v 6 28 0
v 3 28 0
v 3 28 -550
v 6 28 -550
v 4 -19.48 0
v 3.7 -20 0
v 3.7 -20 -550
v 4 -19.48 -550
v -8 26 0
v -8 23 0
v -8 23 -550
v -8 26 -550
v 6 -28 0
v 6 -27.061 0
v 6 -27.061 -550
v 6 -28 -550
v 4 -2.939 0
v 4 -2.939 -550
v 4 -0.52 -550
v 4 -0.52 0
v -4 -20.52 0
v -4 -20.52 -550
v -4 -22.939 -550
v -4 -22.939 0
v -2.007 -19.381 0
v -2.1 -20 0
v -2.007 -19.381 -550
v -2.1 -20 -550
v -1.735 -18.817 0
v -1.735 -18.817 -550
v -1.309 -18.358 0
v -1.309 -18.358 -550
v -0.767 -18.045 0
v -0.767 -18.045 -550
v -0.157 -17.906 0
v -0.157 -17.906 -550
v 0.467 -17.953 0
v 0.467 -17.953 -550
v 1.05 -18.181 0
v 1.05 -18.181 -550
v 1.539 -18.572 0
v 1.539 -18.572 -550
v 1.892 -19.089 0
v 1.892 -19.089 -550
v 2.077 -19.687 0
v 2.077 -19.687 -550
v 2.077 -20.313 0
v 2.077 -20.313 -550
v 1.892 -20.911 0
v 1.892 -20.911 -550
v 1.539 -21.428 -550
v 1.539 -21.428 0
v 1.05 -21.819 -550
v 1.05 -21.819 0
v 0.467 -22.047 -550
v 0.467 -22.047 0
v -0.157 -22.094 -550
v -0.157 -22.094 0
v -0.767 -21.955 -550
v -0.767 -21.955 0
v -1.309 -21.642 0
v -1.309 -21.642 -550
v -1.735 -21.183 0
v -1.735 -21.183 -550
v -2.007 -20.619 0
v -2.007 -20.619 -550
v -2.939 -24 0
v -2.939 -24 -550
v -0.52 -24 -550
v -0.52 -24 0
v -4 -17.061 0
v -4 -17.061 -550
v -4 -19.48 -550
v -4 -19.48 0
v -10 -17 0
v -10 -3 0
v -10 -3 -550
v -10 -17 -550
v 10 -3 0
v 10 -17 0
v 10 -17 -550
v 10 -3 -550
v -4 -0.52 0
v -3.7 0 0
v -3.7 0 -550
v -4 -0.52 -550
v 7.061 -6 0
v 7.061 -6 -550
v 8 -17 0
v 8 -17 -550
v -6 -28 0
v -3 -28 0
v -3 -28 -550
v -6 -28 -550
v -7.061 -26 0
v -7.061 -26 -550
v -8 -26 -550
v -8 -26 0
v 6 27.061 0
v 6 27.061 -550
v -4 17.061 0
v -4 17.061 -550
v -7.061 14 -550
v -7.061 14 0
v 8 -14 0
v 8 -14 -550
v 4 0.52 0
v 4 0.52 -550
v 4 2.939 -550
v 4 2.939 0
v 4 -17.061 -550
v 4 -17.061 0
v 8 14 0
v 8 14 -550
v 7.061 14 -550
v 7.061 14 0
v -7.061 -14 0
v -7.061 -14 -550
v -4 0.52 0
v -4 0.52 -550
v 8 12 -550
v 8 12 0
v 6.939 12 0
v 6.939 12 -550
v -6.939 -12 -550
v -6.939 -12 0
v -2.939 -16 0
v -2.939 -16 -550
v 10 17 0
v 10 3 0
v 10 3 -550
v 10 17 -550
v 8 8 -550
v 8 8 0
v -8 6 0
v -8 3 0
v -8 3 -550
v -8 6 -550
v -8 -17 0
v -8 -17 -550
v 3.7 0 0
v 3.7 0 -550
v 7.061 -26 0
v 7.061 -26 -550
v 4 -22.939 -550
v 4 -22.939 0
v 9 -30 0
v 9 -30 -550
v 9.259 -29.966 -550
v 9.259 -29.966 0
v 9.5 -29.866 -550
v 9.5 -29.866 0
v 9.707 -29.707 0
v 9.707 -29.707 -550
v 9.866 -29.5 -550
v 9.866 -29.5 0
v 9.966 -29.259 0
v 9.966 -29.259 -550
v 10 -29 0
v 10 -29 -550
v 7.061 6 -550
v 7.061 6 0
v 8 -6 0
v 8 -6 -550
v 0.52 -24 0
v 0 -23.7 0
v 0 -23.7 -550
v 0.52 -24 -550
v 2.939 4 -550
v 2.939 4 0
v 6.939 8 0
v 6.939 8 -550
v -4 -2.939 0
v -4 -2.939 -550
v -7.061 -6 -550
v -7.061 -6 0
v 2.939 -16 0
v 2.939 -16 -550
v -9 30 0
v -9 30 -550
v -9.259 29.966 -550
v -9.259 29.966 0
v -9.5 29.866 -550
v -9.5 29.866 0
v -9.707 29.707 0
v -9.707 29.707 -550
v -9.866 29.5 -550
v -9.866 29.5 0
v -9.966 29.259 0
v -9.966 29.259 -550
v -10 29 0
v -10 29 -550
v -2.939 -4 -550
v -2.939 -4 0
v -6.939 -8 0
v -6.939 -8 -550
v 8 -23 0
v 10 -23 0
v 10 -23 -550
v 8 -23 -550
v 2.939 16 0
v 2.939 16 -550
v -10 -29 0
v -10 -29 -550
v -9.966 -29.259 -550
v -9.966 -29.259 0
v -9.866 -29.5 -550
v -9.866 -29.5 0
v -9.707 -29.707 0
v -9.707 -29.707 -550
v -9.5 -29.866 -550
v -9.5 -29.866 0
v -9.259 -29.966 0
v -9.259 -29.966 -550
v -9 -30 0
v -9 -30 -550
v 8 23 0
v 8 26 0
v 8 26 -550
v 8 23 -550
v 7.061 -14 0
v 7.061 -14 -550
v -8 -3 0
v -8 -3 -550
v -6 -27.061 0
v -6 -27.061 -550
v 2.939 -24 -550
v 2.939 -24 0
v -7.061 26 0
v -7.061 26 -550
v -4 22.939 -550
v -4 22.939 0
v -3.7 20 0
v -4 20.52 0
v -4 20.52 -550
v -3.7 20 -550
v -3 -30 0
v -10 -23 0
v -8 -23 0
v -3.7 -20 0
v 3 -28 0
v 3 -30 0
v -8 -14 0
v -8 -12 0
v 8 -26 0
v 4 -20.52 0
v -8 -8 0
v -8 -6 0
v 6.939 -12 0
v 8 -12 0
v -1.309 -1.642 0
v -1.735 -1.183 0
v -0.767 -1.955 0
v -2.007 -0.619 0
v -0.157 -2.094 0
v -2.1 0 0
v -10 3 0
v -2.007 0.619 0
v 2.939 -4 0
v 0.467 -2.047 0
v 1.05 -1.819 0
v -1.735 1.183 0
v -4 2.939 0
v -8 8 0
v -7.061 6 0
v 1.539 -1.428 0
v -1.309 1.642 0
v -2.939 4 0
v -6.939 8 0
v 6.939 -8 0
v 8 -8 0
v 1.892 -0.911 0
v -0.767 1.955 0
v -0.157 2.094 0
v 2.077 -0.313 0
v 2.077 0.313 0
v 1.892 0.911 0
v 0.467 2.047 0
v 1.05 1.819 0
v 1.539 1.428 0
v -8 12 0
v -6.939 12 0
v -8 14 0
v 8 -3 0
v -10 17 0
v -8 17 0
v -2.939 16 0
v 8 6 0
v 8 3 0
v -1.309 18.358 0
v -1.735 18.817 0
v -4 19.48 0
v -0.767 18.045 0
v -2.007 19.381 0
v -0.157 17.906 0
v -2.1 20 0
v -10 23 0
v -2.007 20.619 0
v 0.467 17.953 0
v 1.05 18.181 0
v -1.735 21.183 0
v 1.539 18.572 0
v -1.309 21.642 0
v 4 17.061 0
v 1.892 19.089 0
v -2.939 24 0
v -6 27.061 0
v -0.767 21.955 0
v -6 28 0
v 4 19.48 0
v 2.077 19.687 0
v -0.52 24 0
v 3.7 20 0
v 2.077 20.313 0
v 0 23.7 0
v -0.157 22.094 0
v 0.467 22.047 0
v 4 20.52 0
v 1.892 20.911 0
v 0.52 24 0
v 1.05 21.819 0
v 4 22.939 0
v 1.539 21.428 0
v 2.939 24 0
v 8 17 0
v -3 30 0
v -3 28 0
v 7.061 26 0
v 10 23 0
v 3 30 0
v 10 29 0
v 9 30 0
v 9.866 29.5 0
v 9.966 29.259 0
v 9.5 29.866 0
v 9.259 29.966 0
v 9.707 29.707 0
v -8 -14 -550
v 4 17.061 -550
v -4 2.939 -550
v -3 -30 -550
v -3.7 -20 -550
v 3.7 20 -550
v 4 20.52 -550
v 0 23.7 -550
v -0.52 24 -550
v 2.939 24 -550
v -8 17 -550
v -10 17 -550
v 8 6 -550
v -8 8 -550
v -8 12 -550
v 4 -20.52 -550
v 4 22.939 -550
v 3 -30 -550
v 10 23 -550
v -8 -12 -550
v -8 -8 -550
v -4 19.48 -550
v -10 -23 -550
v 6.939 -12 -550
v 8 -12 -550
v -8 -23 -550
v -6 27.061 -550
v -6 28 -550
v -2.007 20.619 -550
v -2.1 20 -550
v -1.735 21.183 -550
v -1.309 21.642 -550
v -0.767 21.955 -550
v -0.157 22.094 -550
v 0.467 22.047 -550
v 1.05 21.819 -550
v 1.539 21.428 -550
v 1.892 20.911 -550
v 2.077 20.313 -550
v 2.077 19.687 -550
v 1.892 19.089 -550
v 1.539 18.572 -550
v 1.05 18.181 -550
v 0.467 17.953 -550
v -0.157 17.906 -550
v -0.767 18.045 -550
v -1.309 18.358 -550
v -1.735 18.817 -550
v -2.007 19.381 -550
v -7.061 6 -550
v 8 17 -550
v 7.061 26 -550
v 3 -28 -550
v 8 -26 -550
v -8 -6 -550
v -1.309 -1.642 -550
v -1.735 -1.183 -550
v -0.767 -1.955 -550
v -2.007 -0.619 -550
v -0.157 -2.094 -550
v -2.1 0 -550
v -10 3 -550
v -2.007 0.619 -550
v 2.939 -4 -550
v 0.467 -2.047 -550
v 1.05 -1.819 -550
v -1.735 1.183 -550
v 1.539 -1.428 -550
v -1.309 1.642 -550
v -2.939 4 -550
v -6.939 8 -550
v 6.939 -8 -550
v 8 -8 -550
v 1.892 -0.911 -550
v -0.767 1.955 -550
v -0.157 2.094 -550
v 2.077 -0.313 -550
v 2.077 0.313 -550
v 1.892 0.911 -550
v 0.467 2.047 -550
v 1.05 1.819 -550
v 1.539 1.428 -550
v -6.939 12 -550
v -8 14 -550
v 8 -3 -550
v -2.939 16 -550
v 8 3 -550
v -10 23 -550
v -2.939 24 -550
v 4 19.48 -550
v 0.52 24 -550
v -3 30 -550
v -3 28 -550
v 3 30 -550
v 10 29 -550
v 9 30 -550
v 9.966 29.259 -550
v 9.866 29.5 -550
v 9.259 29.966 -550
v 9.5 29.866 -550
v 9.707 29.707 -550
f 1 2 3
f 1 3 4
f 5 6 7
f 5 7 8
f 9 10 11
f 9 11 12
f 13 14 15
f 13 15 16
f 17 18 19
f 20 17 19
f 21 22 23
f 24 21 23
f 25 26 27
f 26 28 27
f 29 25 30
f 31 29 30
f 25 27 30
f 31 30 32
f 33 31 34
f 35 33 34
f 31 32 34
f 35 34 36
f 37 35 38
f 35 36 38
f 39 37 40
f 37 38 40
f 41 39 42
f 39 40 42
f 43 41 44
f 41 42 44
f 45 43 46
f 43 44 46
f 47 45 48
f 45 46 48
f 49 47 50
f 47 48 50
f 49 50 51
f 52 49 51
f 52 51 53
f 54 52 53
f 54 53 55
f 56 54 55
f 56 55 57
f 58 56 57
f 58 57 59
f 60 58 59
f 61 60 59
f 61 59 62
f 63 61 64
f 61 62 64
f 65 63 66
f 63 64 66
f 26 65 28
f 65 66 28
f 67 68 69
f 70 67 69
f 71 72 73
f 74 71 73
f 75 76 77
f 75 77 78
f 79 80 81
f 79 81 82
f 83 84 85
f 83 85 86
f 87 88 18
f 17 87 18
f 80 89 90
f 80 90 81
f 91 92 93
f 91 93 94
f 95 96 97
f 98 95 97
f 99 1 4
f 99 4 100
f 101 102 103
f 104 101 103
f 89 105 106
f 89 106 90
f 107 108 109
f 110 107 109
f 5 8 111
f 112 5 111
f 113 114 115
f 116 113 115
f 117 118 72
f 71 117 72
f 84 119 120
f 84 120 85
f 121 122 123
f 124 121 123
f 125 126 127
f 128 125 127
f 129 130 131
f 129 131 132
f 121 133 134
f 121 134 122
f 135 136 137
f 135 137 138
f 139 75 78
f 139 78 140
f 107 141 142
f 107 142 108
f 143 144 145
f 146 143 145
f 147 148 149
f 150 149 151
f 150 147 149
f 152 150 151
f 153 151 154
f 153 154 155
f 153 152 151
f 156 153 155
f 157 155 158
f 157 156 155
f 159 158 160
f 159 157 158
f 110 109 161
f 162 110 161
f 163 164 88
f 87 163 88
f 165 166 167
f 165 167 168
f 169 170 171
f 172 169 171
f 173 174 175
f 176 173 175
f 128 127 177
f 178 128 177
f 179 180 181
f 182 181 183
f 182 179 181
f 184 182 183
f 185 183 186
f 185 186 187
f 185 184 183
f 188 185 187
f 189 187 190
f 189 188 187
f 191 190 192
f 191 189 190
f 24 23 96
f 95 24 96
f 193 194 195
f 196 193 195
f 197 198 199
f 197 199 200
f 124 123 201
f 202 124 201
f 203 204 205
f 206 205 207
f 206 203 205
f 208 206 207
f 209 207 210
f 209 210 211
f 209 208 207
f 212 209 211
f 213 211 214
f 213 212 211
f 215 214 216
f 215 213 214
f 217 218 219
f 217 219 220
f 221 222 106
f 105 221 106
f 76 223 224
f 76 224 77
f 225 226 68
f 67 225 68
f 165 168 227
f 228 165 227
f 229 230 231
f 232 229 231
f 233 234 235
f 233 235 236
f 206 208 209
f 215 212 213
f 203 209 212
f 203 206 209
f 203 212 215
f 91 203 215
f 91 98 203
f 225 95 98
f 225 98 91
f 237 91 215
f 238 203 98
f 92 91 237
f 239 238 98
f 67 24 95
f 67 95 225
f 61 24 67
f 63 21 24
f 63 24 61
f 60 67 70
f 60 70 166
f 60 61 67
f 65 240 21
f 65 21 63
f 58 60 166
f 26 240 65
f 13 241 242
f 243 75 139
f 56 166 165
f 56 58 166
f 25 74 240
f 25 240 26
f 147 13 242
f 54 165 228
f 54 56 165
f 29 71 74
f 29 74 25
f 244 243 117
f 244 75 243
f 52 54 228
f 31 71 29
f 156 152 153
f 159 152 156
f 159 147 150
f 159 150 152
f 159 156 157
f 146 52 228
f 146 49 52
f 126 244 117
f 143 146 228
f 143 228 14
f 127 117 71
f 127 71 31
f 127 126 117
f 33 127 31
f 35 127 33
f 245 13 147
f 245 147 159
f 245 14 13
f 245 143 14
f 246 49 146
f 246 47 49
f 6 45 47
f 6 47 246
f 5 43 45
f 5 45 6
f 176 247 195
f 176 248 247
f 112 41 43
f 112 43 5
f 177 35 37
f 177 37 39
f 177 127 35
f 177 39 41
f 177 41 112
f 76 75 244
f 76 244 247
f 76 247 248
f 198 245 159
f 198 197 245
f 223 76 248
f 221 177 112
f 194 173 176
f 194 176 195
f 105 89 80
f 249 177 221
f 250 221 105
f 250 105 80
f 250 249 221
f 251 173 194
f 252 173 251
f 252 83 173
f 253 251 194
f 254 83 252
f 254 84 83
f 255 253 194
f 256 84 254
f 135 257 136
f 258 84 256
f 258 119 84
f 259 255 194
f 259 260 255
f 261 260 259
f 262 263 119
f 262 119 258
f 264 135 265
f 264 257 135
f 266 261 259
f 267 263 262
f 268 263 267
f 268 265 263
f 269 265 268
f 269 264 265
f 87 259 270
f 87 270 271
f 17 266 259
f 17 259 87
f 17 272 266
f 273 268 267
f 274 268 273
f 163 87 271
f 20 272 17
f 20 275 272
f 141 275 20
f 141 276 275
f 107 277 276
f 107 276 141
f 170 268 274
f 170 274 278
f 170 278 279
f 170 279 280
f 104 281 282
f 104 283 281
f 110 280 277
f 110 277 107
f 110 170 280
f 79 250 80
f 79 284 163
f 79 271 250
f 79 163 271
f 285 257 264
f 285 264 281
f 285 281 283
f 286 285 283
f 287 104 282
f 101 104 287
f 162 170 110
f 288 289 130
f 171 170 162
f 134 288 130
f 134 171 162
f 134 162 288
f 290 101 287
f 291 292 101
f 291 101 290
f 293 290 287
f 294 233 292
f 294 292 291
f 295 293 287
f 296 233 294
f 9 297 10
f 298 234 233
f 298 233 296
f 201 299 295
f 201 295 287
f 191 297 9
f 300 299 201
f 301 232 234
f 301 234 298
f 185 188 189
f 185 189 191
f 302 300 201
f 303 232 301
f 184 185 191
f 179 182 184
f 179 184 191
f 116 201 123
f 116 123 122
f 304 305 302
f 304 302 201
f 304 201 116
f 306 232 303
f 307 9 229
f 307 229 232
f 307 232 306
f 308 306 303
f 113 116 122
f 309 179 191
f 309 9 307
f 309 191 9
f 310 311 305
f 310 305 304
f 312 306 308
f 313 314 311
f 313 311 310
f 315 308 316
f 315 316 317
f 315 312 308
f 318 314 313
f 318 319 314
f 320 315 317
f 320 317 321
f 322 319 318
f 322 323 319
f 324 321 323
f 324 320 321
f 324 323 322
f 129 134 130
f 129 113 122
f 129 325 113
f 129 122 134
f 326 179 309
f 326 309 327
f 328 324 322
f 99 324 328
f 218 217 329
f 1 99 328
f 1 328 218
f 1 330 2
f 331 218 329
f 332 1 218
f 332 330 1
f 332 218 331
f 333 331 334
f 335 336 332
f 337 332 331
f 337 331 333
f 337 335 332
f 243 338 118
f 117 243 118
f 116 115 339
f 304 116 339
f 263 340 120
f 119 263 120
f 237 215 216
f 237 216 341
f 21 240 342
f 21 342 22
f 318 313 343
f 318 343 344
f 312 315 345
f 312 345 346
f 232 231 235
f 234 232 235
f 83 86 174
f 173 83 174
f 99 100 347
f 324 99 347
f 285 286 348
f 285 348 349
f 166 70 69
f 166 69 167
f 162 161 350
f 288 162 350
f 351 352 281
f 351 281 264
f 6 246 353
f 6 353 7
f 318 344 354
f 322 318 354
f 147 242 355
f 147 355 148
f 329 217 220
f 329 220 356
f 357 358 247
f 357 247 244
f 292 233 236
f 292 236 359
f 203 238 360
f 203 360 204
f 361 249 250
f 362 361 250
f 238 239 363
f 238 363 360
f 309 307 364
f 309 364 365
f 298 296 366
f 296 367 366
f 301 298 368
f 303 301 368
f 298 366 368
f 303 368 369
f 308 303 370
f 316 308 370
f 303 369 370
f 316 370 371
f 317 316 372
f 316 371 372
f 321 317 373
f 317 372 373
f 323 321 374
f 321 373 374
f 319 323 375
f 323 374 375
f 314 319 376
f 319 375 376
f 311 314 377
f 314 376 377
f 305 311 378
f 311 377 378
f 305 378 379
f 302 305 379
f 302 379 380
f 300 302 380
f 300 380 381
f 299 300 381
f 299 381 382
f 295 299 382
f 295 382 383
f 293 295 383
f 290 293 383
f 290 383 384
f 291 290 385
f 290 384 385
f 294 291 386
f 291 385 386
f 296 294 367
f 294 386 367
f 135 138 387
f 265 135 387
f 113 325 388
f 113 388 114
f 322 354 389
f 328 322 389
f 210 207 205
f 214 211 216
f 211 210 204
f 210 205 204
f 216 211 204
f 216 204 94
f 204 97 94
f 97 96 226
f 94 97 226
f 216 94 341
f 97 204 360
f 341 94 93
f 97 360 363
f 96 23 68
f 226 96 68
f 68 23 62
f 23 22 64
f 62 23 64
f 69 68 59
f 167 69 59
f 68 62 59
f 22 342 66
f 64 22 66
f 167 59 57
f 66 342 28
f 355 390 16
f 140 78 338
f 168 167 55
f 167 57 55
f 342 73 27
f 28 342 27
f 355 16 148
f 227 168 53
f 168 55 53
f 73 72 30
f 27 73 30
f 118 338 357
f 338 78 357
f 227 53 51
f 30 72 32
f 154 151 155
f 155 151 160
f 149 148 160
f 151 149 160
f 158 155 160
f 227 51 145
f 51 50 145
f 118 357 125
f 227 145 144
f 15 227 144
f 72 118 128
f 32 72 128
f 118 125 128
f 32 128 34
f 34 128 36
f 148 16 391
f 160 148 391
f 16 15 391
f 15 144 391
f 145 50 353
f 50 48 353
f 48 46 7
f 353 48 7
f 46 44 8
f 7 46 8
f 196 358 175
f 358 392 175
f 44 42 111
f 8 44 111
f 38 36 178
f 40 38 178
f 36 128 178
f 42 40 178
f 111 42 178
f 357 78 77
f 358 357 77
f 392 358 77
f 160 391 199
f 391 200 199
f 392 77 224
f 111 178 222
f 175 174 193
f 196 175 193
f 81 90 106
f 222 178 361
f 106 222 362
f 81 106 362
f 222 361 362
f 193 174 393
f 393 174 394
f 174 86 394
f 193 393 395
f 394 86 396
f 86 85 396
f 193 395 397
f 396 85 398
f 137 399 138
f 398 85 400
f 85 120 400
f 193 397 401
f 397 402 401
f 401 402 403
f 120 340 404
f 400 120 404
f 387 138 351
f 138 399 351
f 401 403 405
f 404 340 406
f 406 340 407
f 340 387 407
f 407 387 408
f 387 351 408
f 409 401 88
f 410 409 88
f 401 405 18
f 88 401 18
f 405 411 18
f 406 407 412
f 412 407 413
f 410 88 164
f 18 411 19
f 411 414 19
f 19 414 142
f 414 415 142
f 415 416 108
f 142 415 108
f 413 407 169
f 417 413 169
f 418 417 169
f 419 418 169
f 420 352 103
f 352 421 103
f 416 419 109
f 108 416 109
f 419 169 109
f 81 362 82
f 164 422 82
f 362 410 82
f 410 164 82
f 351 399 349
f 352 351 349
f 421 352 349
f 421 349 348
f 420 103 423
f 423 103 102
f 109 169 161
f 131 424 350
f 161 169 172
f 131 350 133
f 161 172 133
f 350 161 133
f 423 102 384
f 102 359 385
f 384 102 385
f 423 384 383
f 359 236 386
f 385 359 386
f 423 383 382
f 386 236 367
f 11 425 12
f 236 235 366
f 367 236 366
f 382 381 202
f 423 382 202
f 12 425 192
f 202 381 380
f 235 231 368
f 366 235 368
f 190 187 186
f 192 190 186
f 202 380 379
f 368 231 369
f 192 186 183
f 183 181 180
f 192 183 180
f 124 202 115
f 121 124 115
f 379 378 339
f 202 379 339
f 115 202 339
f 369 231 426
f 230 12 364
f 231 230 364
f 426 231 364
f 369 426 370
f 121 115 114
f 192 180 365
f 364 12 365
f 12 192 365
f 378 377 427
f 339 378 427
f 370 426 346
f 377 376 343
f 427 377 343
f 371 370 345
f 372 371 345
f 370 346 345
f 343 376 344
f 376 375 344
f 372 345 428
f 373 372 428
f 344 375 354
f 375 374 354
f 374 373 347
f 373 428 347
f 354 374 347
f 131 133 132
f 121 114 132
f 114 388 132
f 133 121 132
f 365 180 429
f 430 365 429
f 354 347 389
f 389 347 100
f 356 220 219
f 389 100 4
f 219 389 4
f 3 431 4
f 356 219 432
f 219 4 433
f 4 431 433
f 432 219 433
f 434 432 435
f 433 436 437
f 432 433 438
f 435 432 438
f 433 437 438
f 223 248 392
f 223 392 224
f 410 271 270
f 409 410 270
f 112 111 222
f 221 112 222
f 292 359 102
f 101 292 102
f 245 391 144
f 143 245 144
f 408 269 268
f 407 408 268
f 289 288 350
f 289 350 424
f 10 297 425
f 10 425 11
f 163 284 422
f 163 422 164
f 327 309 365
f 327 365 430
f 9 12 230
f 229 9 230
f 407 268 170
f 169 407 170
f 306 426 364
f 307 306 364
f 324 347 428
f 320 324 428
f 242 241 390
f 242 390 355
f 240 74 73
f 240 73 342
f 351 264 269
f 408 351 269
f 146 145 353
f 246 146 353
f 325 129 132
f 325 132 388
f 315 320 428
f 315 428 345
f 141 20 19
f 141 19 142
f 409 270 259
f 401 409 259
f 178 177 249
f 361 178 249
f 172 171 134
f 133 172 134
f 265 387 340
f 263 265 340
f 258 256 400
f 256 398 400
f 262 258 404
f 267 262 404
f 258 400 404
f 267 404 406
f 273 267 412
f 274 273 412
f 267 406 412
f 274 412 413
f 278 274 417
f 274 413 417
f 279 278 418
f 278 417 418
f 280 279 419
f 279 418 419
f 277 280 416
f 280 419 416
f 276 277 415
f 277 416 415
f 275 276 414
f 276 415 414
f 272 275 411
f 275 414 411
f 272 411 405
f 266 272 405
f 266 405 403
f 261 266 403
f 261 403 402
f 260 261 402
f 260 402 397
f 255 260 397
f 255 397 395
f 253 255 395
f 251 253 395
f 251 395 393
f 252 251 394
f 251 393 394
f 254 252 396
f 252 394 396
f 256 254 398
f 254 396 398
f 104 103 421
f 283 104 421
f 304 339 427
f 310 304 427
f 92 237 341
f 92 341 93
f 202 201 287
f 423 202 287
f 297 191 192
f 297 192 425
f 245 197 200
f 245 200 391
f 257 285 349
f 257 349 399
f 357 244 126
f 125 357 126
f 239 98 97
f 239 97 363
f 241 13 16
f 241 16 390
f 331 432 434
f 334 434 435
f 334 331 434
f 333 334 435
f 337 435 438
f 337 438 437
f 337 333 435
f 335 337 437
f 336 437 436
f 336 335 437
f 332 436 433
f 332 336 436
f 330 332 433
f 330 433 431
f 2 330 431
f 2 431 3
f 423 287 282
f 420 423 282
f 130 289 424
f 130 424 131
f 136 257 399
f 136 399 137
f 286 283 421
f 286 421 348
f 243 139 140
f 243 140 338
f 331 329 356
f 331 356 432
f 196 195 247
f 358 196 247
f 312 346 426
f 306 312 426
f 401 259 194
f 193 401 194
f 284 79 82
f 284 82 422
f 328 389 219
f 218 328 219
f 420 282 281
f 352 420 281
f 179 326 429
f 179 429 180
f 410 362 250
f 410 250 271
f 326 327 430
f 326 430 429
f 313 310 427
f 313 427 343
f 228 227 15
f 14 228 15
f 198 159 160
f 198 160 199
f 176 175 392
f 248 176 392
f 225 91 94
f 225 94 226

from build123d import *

# Parameters (mm, degrees)
BOSS_EXTRUDE1_DEPTH = 550
SKETCH2_W           = 550
SKETCH2_H           = 2.1
SKETCH3_W           = 550
SKETCH3_H           = 2.1
SKETCH4_W           = 550
SKETCH4_H           = 2.1


with BuildPart() as part:
    # Sketch1 → Boss-Extrude1 (new body)
    with BuildSketch(Plane.XY):
        with BuildLine():
            Line((-10, -17), (-8, -17))
            Line((-8, -17), (-8, -14))
            Line((-8, -14), (-7.060660172, -14))
            Line((-7.060660172, -14), (-4, -17.060660172))
            Line((-4, -17.060660172), (-4, -19.480384758))
            Line((-4, -19.480384758), (-3.7, -20))
            Line((-3.7, -20), (-4, -20.519615242))
            Line((-4, -20.519615242), (-4, -22.939339828))
            Line((-4, -22.939339828), (-7.060660172, -26))
            Line((-7.060660172, -26), (-8, -26))
            Line((-8, -26), (-8, -23))
            Line((-8, -23), (-10, -23))
            Line((-10, -23), (-10, -29))
            ThreePointArc((-10, -29), (-9.707106781, -29.707106781), (-9, -30))
            Line((-9, -30), (-3, -30))
            Line((-3, -30), (-3, -28))
            Line((-3, -28), (-6, -28))
            Line((-6, -28), (-6, -27.060660172))
            Line((-6, -27.060660172), (-2.939339828, -24))
            Line((-2.939339828, -24), (-0.519615242, -24))
            Line((-0.519615242, -24), (0, -23.7))
            Line((0, -23.7), (0.519615242, -24))
            Line((0.519615242, -24), (2.939339828, -24))
            Line((2.939339828, -24), (6, -27.060660172))
            Line((6, -27.060660172), (6, -28))
            Line((6, -28), (3, -28))
            Line((3, -28), (3, -30))
            Line((3, -30), (9, -30))
            ThreePointArc((9, -30), (9.707106781, -29.707106781), (10, -29))
            Line((10, -29), (10, -23))
            Line((10, -23), (8, -23))
            Line((8, -23), (8, -26))
            Line((8, -26), (7.060660172, -26))
            Line((7.060660172, -26), (4, -22.939339828))
            Line((4, -22.939339828), (4, -20.519615242))
            Line((4, -20.519615242), (3.7, -20))
            Line((3.7, -20), (4, -19.480384758))
            Line((4, -19.480384758), (4, -17.060660172))
            Line((4, -17.060660172), (7.060660172, -14))
            Line((7.060660172, -14), (8, -14))
            Line((8, -14), (8, -17))
            Line((8, -17), (10, -17))
            Line((10, -17), (10, -3))
            Line((10, -3), (8, -3))
            Line((8, -3), (8, -6))
            Line((8, -6), (7.060660172, -6))
            Line((7.060660172, -6), (4, -2.939339828))
            Line((4, -2.939339828), (4, -0.519615242))
            Line((4, -0.519615242), (3.7, 0))
            Line((3.7, 0), (4, 0.519615242))
            Line((4, 0.519615242), (4, 2.939339828))
            Line((4, 2.939339828), (7.060660172, 6))
            Line((7.060660172, 6), (8, 6))
            Line((8, 6), (8, 3))
            Line((8, 3), (10, 3))
            Line((10, 3), (10, 17))
            Line((10, 17), (8, 17))
            Line((8, 17), (8, 14))
            Line((8, 14), (7.060660172, 14))
            Line((7.060660172, 14), (4, 17.060660172))
            Line((4, 17.060660172), (4, 19.480384758))
            Line((4, 19.480384758), (3.7, 20))
            Line((3.7, 20), (4, 20.519615242))
            Line((4, 20.519615242), (4, 22.939339828))
            Line((4, 22.939339828), (7.060660172, 26))
            Line((7.060660172, 26), (8, 26))
            Line((8, 26), (8, 23))
            Line((8, 23), (10, 23))
            Line((10, 23), (10, 29))
            ThreePointArc((10, 29), (9.707106781, 29.707106781), (9, 30))
            Line((9, 30), (3, 30))
            Line((3, 30), (3, 28))
            Line((3, 28), (6, 28))
            Line((6, 28), (6, 27.060660172))
            Line((6, 27.060660172), (2.939339828, 24))
            Line((2.939339828, 24), (0.519615242, 24))
            Line((0.519615242, 24), (0, 23.7))
            Line((0, 23.7), (-0.519615242, 24))
            Line((-0.519615242, 24), (-2.939339828, 24))
            Line((-2.939339828, 24), (-6, 27.060660172))
            Line((-6, 27.060660172), (-6, 28))
            Line((-6, 28), (-3, 28))
            Line((-3, 28), (-3, 30))
            Line((-3, 30), (-9, 30))
            ThreePointArc((-9, 30), (-9.707106781, 29.707106781), (-10, 29))
            Line((-10, 29), (-10, 23))
            Line((-10, 23), (-8, 23))
            Line((-8, 23), (-8, 26))
            Line((-8, 26), (-7.060660172, 26))
            Line((-7.060660172, 26), (-4, 22.939339828))
            Line((-4, 22.939339828), (-4, 20.519615242))
            Line((-4, 20.519615242), (-3.7, 20))
            Line((-3.7, 20), (-4, 19.480384758))
            Line((-4, 19.480384758), (-4, 17.060660172))
            Line((-4, 17.060660172), (-7.060660172, 14))
            Line((-7.060660172, 14), (-8, 14))
            Line((-8, 14), (-8, 17))
            Line((-8, 17), (-10, 17))
            Line((-10, 17), (-10, 3))
            Line((-10, 3), (-8, 3))
            Line((-8, 3), (-8, 6))
            Line((-8, 6), (-7.060660172, 6))
            Line((-7.060660172, 6), (-4, 2.939339828))
            Line((-4, 2.939339828), (-4, 0.519615242))
            Line((-4, 0.519615242), (-3.7, 0))
            Line((-3.7, 0), (-4, -0.519615242))
            Line((-4, -0.519615242), (-4, -2.939339828))
            Line((-4, -2.939339828), (-7.060660172, -6))
            Line((-7.060660172, -6), (-8, -6))
            Line((-8, -6), (-8, -3))
            Line((-8, -3), (-10, -3))
            Line((-10, -3), (-10, -17))
        make_face()
        Polygon((-8, 8), (-6.939339828, 8), (-2.939339828, 4), (2.939339828, 4), (6.939339828, 8), (8, 8), (8, 12), (6.939339828, 12), (2.939339828, 16), (-2.939339828, 16), (-6.939339828, 12), (-8, 12), align=None, mode=Mode.SUBTRACT)
        Polygon((-8, -8), (-8, -12), (-6.939339828, -12), (-2.939339828, -16), (2.939339828, -16), (6.939339828, -12), (8, -12), (8, -8), (6.939339828, -8), (2.939339828, -4), (-2.939339828, -4), (-6.939339828, -8), align=None, mode=Mode.SUBTRACT)
    extrude(amount=-BOSS_EXTRUDE1_DEPTH)

    # Sketch2 → Cut-Revolve1 (revolve, cut)
    with BuildSketch(Plane(origin=(0, 0, 0), x_dir=(0, 0, -1), z_dir=(1, 0, 0)), mode=Mode.PRIVATE) as cut_revolve1_sk:
        with Locations((275, 18.95)):
            Rectangle(SKETCH2_W, SKETCH2_H)
    revolve(cut_revolve1_sk.sketch.rotate(Axis((0, 20, 0), (0, 0, -1)), 90), axis=Axis((0, 20, 0), (0, 0, -1)), mode=Mode.SUBTRACT)

    # Sketch3 → Cut-Revolve2 (revolve, cut)
    with BuildSketch(Plane(origin=(0, 0, 0), x_dir=(0, 0, -1), z_dir=(1, 0, 0)), mode=Mode.PRIVATE) as cut_revolve2_sk:
        with Locations((275, -1.05)):
            Rectangle(SKETCH3_W, SKETCH3_H)
    revolve(cut_revolve2_sk.sketch.rotate(Axis((0, 0, 0), (0, 0, -1)), 90), axis=Axis((0, 0, 0), (0, 0, -1)), mode=Mode.SUBTRACT)

    # Sketch4 → Cut-Revolve3 (revolve, cut)
    with BuildSketch(Plane(origin=(0, 0, 0), x_dir=(0, 0, -1), z_dir=(1, 0, 0)), mode=Mode.PRIVATE) as cut_revolve3_sk:
        with Locations((275, -21.05)):
            Rectangle(SKETCH4_W, SKETCH4_H)
    revolve(cut_revolve3_sk.sketch.rotate(Axis((0, -20, 0), (0, 0, -1)), 90), axis=Axis((0, -20, 0), (0, 0, -1)), mode=Mode.SUBTRACT)


solid = part.part
